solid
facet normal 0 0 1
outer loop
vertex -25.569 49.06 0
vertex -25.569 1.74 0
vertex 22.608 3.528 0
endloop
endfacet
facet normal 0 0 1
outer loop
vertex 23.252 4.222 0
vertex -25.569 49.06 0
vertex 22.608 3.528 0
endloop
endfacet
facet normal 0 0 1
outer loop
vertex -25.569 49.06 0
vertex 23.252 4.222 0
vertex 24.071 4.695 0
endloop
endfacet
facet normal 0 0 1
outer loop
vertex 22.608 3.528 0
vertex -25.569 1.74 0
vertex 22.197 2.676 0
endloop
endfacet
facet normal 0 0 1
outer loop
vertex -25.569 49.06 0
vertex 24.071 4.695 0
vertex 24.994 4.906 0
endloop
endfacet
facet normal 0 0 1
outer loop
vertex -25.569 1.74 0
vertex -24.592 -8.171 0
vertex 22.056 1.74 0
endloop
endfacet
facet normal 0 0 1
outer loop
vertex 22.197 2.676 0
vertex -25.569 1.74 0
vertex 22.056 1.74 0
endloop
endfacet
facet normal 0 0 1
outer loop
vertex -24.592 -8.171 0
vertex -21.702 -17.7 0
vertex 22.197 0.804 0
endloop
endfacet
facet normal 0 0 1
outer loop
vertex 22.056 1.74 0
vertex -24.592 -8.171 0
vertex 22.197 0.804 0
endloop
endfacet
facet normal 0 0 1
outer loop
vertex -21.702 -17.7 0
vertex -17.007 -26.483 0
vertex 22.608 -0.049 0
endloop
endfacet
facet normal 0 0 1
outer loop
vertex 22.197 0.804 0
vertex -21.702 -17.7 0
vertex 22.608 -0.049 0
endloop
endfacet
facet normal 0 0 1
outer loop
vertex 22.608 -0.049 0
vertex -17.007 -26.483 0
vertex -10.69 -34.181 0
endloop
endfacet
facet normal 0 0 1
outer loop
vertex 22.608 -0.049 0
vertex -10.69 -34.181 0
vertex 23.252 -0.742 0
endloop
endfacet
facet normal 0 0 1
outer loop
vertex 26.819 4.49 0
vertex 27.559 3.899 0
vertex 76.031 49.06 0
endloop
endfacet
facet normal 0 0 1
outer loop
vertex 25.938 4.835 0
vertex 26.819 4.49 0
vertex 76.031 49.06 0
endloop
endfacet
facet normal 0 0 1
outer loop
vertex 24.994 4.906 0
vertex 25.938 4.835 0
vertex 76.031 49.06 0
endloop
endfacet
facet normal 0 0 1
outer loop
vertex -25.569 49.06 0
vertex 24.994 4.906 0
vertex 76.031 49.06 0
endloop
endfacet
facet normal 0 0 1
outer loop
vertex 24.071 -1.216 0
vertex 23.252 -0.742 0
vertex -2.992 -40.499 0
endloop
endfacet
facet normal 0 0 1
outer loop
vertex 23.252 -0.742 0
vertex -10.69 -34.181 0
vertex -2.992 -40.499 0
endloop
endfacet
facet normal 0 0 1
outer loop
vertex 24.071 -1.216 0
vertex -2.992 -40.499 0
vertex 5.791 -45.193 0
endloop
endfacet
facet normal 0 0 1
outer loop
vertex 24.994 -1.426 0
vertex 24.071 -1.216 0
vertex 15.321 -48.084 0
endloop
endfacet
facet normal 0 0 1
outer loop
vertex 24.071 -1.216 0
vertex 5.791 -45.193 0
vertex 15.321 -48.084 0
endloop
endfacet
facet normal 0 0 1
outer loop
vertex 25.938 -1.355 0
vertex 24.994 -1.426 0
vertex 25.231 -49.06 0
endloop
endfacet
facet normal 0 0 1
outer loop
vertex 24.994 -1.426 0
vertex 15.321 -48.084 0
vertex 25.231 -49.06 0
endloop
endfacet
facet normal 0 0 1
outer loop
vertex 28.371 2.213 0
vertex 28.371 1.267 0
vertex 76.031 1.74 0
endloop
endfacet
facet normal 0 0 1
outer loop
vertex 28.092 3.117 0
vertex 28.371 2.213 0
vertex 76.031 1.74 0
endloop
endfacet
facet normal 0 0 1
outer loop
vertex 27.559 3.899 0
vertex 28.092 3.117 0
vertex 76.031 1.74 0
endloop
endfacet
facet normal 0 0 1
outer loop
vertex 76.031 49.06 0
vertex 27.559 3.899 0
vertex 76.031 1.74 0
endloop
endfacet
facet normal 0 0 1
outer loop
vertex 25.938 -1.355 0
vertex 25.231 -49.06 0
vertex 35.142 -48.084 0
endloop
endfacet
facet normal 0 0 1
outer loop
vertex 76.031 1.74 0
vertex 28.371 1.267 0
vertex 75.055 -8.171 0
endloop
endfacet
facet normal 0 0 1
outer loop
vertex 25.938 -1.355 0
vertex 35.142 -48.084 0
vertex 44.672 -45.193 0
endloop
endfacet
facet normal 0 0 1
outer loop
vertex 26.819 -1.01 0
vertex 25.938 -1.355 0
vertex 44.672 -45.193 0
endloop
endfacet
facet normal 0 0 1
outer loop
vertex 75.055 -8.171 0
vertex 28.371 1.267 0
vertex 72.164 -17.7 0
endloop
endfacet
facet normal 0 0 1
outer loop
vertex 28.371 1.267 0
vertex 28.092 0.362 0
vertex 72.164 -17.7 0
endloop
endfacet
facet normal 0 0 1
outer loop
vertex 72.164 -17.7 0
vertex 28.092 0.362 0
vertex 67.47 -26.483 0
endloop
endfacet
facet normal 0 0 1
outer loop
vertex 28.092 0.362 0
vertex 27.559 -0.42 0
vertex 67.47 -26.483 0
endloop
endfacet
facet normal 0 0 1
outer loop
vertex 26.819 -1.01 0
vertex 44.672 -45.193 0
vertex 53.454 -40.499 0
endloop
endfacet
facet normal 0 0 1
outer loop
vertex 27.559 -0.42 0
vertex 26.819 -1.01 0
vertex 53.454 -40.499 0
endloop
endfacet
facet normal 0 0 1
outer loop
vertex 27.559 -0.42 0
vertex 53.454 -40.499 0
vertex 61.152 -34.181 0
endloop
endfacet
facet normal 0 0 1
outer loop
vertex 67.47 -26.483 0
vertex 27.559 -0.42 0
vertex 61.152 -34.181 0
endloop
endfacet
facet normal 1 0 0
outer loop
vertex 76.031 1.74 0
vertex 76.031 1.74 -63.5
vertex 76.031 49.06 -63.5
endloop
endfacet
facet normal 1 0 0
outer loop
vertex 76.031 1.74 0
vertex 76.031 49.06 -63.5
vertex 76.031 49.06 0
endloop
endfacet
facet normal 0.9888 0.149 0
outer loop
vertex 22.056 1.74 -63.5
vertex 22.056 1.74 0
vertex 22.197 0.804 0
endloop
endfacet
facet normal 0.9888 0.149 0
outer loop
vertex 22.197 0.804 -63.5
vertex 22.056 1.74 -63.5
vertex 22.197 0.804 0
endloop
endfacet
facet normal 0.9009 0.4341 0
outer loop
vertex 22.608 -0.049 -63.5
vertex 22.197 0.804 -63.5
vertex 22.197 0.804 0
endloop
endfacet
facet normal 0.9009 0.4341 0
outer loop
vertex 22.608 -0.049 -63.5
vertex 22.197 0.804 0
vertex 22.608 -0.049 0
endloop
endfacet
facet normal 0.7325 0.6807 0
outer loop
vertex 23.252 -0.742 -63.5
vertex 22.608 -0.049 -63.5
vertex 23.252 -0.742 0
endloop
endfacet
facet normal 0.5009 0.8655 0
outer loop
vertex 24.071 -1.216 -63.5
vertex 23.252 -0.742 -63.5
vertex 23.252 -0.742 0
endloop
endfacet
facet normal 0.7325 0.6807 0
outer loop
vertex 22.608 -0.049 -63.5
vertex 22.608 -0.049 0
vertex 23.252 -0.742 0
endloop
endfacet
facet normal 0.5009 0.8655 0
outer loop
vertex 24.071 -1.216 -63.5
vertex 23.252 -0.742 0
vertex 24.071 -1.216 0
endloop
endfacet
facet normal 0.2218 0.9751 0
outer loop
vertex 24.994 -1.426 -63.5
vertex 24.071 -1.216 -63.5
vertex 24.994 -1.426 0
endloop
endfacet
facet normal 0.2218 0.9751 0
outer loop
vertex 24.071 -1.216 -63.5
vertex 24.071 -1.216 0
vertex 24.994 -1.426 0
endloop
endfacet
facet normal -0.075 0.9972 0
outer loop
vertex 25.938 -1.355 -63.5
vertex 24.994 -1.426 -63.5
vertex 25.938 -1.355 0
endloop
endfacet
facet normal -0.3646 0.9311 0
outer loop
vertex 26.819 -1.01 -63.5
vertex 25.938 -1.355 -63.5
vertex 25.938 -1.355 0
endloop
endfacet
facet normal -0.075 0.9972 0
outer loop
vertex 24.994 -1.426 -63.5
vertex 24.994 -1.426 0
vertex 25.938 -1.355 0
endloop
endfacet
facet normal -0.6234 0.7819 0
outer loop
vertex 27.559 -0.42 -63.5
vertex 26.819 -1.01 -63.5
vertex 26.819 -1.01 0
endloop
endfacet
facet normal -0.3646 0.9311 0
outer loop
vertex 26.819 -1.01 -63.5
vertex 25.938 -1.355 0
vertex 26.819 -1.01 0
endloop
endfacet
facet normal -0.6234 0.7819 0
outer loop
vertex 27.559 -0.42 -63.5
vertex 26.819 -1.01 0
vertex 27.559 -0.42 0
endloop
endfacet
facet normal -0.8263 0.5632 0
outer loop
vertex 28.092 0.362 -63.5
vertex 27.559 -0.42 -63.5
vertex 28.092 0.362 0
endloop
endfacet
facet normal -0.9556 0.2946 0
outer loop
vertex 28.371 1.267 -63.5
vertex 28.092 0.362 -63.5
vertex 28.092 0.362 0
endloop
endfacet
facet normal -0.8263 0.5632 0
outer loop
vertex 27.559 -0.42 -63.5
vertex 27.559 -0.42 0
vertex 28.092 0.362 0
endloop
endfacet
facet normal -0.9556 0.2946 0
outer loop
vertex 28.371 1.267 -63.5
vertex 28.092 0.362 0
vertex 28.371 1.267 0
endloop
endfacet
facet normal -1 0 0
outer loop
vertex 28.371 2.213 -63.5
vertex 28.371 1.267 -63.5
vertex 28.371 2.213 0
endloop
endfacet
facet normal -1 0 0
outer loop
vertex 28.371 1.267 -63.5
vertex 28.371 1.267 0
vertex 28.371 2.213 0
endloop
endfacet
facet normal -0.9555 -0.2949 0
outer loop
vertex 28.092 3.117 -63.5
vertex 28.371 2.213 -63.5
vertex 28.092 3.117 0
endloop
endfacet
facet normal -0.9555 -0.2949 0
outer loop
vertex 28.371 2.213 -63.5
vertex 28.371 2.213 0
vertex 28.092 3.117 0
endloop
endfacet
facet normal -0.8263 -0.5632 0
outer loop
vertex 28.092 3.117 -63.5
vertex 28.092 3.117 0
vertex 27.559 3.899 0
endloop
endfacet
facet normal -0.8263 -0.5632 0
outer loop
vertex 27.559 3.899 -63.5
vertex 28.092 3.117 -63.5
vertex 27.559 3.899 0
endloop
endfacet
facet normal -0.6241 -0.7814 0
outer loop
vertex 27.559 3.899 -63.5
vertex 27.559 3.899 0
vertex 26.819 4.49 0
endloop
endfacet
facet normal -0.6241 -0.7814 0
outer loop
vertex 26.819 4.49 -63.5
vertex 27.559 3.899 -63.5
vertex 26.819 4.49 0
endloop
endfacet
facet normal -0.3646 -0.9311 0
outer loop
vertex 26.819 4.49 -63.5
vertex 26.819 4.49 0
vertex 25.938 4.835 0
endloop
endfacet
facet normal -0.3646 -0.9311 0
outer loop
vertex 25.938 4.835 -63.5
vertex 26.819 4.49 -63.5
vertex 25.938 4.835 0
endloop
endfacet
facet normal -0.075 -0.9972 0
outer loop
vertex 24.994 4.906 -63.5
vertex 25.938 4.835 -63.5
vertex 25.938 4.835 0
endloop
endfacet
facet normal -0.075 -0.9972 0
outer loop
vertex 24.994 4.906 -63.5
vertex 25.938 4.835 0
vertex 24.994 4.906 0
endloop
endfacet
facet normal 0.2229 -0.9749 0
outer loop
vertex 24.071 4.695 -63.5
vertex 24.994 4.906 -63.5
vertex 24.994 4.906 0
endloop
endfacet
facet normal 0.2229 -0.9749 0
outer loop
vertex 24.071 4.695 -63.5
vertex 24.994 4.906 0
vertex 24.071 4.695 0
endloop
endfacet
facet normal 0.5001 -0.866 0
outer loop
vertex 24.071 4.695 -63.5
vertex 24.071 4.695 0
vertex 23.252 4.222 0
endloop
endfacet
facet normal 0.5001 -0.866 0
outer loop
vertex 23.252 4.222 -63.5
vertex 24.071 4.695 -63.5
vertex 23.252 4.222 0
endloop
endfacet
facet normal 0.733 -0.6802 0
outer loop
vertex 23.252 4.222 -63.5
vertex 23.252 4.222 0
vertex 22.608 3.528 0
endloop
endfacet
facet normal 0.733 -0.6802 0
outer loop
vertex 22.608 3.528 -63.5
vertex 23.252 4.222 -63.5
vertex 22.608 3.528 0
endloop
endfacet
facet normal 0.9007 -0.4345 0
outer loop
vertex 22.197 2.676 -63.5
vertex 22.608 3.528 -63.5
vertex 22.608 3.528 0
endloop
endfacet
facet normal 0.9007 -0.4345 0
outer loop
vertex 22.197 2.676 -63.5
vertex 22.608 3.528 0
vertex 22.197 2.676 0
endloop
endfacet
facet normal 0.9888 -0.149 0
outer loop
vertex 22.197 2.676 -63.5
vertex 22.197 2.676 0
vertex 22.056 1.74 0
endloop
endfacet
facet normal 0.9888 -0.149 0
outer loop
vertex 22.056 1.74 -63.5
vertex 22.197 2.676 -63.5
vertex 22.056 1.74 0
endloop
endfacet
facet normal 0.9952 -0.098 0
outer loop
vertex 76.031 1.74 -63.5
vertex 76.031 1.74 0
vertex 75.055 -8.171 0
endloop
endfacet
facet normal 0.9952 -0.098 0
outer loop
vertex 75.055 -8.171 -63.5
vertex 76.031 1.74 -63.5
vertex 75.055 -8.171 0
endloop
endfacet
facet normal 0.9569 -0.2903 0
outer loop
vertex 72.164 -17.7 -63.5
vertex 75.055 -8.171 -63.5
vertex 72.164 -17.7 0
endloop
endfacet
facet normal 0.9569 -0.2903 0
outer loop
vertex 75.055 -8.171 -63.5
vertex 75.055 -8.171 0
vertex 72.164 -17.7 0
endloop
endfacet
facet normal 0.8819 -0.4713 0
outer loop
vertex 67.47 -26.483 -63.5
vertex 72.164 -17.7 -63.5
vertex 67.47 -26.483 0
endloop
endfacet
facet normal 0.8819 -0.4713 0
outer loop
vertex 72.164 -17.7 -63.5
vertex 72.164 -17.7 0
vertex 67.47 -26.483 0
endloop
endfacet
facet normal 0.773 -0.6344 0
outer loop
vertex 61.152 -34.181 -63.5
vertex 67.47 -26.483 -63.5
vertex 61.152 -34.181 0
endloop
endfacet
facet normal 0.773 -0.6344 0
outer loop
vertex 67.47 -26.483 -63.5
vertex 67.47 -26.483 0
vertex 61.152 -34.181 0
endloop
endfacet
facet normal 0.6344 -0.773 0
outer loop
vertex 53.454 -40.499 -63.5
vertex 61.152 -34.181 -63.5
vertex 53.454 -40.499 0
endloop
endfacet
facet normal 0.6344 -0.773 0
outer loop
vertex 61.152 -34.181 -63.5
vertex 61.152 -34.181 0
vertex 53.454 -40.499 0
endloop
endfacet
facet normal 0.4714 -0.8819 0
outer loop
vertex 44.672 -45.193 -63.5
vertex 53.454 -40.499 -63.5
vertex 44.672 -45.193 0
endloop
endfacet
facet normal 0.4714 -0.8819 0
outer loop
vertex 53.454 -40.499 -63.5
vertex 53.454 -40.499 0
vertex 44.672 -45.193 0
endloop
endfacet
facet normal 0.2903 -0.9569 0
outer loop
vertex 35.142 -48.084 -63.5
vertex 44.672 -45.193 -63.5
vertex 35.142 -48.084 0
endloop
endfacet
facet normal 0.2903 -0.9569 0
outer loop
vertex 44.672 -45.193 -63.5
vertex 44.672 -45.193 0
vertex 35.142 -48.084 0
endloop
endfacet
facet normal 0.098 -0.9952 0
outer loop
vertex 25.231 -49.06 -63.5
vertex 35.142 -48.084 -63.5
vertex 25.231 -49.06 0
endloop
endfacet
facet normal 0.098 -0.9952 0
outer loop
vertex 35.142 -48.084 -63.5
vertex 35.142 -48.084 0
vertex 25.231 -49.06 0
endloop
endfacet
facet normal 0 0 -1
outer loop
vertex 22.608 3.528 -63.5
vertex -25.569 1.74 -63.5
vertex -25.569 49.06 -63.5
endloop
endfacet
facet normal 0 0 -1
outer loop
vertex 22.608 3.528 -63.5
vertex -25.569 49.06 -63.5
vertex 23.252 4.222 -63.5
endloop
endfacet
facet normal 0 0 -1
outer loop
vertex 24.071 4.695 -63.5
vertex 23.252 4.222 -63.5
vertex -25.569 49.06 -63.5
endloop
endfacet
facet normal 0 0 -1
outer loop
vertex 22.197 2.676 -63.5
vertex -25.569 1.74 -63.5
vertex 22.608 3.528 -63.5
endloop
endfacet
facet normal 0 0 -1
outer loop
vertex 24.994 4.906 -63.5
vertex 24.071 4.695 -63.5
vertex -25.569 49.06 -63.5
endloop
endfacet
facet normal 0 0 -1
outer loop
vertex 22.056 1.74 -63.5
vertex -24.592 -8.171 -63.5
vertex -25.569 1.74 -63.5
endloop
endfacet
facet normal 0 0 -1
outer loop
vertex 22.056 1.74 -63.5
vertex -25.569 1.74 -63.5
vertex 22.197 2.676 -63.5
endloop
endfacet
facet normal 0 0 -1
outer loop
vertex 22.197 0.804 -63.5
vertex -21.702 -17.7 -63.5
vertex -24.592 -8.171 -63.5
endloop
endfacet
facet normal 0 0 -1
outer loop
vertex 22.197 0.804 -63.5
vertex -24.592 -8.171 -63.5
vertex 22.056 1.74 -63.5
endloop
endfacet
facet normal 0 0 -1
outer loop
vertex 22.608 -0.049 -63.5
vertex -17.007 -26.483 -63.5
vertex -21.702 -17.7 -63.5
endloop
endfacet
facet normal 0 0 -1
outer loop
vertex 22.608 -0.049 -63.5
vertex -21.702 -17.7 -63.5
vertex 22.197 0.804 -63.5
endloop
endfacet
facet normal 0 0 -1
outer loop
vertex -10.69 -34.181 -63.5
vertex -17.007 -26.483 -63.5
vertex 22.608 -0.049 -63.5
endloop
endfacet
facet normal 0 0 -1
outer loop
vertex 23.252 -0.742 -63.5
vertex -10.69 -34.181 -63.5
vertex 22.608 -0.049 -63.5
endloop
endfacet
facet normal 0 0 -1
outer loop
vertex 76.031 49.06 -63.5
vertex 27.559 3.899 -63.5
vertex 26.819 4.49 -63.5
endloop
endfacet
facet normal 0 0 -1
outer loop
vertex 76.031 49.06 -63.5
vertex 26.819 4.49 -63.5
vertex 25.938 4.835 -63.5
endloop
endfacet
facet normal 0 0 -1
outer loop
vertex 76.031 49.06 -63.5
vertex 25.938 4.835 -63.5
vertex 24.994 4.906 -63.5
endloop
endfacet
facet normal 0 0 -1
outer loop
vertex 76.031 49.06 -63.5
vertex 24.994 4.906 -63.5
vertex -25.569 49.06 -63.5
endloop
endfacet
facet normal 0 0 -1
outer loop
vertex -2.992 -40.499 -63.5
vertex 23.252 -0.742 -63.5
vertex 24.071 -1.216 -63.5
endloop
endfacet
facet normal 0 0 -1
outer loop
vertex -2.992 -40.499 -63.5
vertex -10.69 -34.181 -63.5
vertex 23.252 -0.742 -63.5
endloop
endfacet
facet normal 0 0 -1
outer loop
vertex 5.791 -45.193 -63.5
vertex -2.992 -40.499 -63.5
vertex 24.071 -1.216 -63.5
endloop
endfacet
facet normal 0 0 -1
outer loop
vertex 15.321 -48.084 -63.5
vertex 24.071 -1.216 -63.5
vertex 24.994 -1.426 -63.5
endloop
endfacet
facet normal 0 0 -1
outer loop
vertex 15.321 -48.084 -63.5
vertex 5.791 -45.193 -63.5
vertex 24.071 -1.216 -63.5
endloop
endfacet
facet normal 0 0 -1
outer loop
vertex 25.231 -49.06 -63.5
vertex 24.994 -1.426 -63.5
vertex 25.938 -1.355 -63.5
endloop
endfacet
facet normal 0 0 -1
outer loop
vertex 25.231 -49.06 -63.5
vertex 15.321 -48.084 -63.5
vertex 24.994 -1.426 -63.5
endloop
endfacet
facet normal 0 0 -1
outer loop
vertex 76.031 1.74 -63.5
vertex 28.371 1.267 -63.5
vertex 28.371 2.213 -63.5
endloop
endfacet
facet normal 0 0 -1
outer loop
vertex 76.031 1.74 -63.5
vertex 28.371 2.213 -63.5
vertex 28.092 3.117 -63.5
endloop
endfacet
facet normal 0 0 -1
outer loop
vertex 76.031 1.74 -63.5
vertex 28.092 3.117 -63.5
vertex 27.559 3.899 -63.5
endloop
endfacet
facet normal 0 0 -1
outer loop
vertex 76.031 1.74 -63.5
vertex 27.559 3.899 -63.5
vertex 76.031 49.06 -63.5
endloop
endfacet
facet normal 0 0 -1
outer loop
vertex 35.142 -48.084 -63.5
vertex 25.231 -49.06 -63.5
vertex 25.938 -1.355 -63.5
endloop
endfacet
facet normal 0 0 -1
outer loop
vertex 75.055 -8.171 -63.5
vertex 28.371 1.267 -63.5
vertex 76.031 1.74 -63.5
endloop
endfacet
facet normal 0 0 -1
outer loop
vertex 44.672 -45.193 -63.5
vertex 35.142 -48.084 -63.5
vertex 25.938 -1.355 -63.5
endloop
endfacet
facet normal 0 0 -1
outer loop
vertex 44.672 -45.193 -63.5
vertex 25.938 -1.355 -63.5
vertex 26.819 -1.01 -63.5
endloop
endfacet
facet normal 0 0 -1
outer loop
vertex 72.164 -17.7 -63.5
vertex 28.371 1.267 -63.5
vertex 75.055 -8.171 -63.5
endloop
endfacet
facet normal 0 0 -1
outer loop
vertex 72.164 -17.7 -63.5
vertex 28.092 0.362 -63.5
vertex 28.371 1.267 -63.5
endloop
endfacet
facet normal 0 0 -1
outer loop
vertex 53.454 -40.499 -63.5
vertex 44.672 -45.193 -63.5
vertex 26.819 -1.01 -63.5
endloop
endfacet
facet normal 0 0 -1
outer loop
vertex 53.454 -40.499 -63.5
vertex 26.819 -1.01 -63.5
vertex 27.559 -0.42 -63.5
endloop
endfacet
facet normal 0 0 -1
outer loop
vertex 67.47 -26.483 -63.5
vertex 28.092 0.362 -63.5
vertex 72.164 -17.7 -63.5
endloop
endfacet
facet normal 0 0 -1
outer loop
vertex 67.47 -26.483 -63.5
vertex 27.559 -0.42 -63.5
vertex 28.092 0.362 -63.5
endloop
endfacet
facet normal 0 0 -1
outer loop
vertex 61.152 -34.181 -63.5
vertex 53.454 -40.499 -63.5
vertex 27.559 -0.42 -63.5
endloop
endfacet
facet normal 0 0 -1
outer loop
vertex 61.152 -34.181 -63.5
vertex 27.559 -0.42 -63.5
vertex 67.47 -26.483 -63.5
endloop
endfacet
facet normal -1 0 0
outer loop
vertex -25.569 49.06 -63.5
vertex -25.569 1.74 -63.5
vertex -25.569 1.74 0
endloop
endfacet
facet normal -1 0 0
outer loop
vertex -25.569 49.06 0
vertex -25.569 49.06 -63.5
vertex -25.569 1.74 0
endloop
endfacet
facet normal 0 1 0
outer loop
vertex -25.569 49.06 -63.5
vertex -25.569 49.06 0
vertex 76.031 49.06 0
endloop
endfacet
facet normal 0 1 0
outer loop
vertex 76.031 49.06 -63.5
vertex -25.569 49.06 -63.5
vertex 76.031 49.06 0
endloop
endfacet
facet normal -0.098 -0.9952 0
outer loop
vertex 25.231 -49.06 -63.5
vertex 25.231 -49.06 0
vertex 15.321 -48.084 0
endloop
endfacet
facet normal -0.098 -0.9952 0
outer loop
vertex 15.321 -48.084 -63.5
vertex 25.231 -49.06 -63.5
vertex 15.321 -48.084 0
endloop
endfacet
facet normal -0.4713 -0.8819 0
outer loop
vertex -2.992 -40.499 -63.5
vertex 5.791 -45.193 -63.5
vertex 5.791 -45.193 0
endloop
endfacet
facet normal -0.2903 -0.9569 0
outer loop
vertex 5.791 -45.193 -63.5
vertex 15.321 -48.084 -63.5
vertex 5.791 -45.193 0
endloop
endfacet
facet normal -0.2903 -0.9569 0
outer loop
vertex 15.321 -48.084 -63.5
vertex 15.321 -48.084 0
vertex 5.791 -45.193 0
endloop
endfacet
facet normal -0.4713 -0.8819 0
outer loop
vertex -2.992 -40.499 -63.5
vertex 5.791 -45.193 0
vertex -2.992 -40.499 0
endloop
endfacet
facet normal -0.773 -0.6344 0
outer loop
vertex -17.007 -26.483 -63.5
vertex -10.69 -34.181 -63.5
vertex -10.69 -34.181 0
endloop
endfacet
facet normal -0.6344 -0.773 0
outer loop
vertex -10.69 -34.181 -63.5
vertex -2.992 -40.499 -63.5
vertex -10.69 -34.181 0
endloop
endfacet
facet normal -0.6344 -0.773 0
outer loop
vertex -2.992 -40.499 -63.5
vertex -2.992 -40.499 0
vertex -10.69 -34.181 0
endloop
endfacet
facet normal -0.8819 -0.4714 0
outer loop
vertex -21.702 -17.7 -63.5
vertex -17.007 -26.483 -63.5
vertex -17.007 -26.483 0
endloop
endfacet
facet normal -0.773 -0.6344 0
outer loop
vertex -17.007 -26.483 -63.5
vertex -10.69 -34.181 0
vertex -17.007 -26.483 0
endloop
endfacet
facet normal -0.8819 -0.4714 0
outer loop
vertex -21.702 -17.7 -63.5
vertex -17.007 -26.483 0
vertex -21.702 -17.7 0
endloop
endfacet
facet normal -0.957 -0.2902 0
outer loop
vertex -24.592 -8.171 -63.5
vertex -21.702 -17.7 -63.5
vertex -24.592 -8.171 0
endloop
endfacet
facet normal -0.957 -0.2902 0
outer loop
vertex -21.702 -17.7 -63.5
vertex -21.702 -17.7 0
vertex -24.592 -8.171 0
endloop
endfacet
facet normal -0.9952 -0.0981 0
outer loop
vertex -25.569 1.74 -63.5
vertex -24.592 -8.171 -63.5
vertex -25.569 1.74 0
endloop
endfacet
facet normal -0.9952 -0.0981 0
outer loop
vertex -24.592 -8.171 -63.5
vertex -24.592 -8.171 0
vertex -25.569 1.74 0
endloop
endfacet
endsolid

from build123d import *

# Parameters (mm, degrees)
F0_W     = 101.6
F0_H     = 63.5
F1_DEPTH = 49.0601
F3_DEPTH = 63.501
F5_D     = 6.35


with BuildPart() as f1:
    # F0 (on Front) → F1 (new body, symmetric)
    with BuildSketch(Plane.XZ):
        with Locations((25.231418, -31.75)):
            Rectangle(F0_W, F0_H)
    extrude(amount=F1_DEPTH, both=True)

    # F2 (on face) → F3 (cut, through all)
    with BuildSketch(Plane.XY):
        with BuildLine():
            ThreePointArc((25.231418, -49.0601), (-10.689607, -34.181124), (-25.568582, 1.7399))
            Line((-25.568582, 1.7399), (-25.568582, -49.0601))
            Line((-25.568582, -49.0601), (25.231418, -49.0601))
        make_face()
        with BuildLine():
            Line((76.031418, -49.0601), (76.031418, 1.7399))
            ThreePointArc((76.031418, 1.7399), (61.152442, -34.181124), (25.231418, -49.0601))
            Line((25.231418, -49.0601), (76.031418, -49.0601))
        make_face()
    extrude(amount=-F3_DEPTH, mode=Mode.SUBTRACT)

    # F5 (through all)
    with Locations(Plane(origin=(0, 0, -63.5), x_dir=(1, 0, 0), z_dir=(0, 0, -1))):
        with Locations((25.231418, -1.7399)):
            Hole(F5_D / 2)


solid = f1.part
